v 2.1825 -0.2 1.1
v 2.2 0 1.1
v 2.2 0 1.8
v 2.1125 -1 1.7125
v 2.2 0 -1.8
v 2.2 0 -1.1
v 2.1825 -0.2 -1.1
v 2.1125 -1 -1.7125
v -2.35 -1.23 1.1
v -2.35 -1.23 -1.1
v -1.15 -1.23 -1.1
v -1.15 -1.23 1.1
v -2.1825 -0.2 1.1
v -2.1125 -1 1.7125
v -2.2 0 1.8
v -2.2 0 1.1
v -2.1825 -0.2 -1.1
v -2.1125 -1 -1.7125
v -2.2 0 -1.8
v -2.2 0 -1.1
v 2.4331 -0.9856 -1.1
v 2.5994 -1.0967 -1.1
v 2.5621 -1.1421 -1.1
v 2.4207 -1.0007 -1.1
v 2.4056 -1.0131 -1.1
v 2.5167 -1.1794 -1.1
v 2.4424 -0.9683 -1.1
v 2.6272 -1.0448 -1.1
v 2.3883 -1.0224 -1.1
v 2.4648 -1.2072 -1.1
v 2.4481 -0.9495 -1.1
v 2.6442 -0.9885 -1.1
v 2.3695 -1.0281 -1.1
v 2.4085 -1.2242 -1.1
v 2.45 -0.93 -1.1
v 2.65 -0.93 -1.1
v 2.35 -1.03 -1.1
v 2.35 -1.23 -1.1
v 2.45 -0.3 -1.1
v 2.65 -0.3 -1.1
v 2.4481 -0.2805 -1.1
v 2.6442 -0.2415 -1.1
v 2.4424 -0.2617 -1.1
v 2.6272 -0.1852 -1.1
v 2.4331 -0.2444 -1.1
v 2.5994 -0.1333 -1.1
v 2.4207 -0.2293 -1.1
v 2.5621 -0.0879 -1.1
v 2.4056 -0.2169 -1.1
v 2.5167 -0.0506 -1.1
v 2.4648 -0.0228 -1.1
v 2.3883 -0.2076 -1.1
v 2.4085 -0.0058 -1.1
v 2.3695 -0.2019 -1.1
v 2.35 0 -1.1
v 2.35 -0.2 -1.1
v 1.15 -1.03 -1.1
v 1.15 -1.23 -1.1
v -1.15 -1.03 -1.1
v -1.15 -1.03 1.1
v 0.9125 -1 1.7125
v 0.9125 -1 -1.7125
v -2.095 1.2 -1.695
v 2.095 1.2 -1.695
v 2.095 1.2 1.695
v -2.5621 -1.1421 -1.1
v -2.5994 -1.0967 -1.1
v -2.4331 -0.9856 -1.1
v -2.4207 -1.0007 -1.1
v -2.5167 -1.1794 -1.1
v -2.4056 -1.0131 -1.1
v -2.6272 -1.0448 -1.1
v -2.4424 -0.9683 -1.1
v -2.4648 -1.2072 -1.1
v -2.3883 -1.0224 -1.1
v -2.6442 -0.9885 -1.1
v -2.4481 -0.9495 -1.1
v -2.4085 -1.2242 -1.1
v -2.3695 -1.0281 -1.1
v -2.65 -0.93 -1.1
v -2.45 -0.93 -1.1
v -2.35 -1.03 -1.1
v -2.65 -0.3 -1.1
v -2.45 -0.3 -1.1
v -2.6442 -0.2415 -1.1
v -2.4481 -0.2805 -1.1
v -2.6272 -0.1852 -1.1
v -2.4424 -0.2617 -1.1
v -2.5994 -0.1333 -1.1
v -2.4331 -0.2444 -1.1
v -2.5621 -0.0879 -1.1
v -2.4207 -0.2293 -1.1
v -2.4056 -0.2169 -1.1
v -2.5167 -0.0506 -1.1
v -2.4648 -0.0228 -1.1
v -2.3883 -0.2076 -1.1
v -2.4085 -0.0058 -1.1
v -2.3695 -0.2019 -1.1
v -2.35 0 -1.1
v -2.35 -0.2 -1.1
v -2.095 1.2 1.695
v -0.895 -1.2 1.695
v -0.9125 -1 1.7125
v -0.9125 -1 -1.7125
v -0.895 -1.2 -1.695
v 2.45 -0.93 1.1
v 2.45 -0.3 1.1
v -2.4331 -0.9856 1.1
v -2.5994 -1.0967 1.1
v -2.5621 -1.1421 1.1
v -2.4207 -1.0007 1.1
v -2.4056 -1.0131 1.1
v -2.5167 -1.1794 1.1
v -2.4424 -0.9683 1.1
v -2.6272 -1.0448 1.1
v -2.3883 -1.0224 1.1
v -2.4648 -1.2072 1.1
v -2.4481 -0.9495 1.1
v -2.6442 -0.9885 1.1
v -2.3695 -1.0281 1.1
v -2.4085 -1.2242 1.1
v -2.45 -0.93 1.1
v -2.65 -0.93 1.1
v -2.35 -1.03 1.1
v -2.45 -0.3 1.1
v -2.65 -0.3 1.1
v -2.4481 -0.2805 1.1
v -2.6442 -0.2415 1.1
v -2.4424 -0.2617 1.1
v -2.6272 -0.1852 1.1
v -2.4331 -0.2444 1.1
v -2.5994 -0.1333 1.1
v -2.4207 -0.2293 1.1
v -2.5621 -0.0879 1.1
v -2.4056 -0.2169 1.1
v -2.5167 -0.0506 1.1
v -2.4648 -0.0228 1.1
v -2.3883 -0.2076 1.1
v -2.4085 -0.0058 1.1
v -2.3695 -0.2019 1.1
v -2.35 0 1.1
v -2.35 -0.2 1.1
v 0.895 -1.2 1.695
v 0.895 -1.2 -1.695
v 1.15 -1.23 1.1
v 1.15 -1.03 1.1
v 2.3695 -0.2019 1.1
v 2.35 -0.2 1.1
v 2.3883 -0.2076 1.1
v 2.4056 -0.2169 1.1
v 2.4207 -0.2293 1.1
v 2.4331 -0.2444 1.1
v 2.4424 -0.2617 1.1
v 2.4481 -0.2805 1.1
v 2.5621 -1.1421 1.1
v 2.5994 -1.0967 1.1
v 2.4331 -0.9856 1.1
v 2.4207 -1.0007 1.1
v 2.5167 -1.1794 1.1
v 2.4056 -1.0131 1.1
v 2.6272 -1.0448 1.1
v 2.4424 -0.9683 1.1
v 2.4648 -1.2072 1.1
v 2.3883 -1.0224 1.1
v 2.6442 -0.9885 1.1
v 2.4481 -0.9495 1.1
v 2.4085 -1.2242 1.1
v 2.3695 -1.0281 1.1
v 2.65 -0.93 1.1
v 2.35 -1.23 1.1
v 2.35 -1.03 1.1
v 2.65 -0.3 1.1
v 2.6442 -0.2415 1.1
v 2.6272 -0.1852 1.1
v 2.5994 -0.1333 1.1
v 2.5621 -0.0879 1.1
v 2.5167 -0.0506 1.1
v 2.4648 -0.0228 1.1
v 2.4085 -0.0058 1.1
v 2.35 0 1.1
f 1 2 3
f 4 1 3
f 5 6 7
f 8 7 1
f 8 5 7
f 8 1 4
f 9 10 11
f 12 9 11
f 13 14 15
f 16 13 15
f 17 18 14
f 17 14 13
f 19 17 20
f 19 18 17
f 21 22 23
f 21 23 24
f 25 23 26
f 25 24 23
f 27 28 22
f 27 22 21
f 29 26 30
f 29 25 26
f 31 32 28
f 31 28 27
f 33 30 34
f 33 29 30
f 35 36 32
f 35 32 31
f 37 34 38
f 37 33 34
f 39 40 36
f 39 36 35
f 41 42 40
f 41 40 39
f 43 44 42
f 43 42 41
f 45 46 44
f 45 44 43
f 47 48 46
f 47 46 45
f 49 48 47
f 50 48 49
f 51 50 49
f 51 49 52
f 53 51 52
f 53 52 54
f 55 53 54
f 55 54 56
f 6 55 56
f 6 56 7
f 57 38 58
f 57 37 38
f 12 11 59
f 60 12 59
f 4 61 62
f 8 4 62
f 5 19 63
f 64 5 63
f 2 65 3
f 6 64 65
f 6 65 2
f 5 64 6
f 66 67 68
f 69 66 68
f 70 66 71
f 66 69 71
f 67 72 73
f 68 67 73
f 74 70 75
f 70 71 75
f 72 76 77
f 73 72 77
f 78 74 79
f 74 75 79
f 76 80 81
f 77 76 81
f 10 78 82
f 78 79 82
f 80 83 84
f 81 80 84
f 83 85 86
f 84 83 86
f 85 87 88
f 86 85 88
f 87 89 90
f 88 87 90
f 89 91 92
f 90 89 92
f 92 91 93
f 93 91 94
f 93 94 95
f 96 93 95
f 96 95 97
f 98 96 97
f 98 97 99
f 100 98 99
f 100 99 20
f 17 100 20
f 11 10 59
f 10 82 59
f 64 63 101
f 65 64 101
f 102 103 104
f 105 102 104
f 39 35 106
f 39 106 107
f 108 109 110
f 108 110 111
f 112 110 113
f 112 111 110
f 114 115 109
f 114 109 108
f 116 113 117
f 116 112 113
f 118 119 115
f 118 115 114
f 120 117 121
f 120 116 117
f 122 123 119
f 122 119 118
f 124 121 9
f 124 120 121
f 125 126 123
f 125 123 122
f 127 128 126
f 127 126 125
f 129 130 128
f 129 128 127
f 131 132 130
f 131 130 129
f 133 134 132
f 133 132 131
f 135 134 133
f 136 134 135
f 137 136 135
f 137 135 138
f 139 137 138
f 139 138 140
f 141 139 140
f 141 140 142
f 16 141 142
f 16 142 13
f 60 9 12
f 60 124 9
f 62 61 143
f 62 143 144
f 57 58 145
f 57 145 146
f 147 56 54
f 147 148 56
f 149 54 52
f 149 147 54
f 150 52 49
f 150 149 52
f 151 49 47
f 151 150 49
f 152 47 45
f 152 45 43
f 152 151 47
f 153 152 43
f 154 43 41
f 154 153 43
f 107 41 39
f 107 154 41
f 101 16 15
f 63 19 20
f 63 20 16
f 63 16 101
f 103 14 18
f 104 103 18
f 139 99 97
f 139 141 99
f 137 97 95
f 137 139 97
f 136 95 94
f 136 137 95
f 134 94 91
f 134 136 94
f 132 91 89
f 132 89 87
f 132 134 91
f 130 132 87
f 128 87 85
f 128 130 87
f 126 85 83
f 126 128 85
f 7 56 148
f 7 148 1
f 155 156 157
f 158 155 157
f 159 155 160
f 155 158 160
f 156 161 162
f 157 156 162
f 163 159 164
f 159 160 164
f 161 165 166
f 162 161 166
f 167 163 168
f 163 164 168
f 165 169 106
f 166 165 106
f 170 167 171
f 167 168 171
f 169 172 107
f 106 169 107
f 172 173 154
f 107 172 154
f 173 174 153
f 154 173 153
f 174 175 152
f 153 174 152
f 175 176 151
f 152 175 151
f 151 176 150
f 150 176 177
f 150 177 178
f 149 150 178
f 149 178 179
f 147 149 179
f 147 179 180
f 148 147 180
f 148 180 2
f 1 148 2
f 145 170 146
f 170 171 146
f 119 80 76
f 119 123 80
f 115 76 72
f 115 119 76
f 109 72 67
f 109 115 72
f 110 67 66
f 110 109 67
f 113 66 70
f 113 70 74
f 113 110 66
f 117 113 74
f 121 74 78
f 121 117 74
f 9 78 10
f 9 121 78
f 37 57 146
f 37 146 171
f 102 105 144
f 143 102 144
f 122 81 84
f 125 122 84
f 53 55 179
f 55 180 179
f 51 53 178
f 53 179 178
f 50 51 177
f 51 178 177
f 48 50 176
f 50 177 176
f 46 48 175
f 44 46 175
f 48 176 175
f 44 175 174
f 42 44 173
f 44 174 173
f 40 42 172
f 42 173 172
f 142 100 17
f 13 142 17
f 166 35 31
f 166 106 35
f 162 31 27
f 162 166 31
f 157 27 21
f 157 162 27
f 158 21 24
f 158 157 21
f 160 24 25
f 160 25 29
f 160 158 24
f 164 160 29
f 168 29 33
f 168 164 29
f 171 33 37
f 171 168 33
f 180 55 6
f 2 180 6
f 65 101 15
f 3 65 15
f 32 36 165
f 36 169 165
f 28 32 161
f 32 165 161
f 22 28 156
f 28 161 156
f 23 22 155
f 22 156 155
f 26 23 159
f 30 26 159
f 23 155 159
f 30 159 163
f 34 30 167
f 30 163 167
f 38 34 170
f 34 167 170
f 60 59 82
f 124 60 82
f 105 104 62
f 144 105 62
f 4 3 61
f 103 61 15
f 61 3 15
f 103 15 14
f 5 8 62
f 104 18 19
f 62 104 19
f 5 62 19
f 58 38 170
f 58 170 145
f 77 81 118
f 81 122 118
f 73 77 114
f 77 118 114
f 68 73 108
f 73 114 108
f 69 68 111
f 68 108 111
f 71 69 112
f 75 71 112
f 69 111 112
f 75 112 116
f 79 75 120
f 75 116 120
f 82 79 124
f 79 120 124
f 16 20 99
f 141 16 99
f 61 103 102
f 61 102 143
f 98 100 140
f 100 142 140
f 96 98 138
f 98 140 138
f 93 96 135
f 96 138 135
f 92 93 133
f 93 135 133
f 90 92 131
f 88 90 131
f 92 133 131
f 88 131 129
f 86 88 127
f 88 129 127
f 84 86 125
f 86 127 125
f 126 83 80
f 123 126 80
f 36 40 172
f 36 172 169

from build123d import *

# Parameters (mm, degrees)
EXTRUDE1_START      = -2.2
EXTRUDE1_DEPTH      = 4.4
EXTRUDE1_START_2    = -3
EXTRUDE1_2_DEPTH    = 6
SKETCH1_3_W         = 2
SKETCH1_3_H         = 3.6
EXTRUDE2_DEPTH      = 1.2
EXTRUDE2_DRAFT      = -5
EXTRUDE3_DEPTH      = 1.1
EXTRUDE3_DEPTH_BACK = 1.1
FILLET1_R           = 0.1
FILLET2_R           = 0.3


with BuildPart() as part:
    # Extrude1: read off the stored shape, not the designer's step
    # Extrude1 outline → Extrude1 (new body)
    with BuildSketch(Plane.YZ.offset(EXTRUDE1_START)):
        Polygon((-1, -1.712511336), (0, -1.8), (1.2, -1.695013604), (1.2, 1.695013604), (0, 1.8), (-1, 1.712511336), align=None)
    extrude(amount=EXTRUDE1_DEPTH)

    # Extrude1 2 outline → Extrude1 2 (cut)
    with BuildSketch(Plane.XY.offset(EXTRUDE1_START_2)):
        Polygon((-2.2, 0), (-2.095013604, 1.2), (-2.2, 1.2), align=None)
        Polygon((-2.112511336, -1), (-2.2, 0), (-2.2, -1), align=None)
        Polygon((2.2, 1.2), (2.095013604, 1.2), (2.2, 0), align=None)
        Polygon((2.2, -1), (2.2, 0), (2.112511336, -1), align=None)
    extrude(amount=EXTRUDE1_2_DEPTH, mode=Mode.SUBTRACT)


with BuildPart() as extrude2_tool:
    # Sketch1<3> → Extrude2 (with draft: the straight prism first)
    with BuildSketch(Plane(origin=(0, 0, 0), x_dir=(1, 0, 0), z_dir=(0, 1, 0))):
        Rectangle(SKETCH1_3_W, SKETCH1_3_H)
    extrude(amount=-EXTRUDE2_DEPTH)
    # Extrude2: the draft: its side faces are tilted about the plane it starts from
    extrude2_sides = [extrude2_tool.faces().sort_by_distance(p)[0] for p in [
        (1, -0.6, 0),
        (0, -0.6, -1.8),
        (-1, -0.6, 0),
        (0, -0.6, 1.8),
    ]]
    draft(extrude2_sides, Plane(origin=(0, 0, 0), x_dir=(1, 0, 0), z_dir=(0, 1, 0)), EXTRUDE2_DRAFT)


with BuildPart() as part_1:
    add(part.part)

    # Extrude2: add extrude2_tool
    add(extrude2_tool.part)

    # Sketch2 → Extrude3 (add, two sides: drawn at the far end of the back side and taken through both)
    with BuildSketch(Plane.XY.offset(-EXTRUDE3_DEPTH_BACK)):
        Polygon((-2.2, 0), (-2.65, 0), (-2.65, -1.23), (-1.15, -1.23), (-1.15, -1.03), (-2.45, -1.03), (-2.45, -0.2), (-1.852332632, -0.2), (-1.852332632, 0), align=None)
        Polygon((1.852332632, 0), (2.2, 0), (2.65, 0), (2.65, -1.23), (1.15, -1.23), (1.15, -1.03), (2.45, -1.03), (2.45, -0.2), (1.852332632, -0.2), align=None)
    extrude(amount=EXTRUDE3_DEPTH + EXTRUDE3_DEPTH_BACK)

    # Fillet1
    fillet1_edges = [part_1.edges().sort_by_distance(p)[0] for p in [
        (-2.45, -1.03, 0),
        (-2.45, -0.2, 0),
        (2.45, -0.2, 0),
        (2.45, -1.03, 0),
    ]]
    fillet(fillet1_edges, radius=FILLET1_R)

    # Fillet2
    fillet2_edges = [part_1.edges().sort_by_distance(p)[0] for p in [
        (-2.65, 0, 0),
        (-2.65, -1.23, 0),
        (2.65, 0, 0),
        (2.65, -1.23, 0),
    ]]
    fillet(fillet2_edges, radius=FILLET2_R)


solid = part_1.part
